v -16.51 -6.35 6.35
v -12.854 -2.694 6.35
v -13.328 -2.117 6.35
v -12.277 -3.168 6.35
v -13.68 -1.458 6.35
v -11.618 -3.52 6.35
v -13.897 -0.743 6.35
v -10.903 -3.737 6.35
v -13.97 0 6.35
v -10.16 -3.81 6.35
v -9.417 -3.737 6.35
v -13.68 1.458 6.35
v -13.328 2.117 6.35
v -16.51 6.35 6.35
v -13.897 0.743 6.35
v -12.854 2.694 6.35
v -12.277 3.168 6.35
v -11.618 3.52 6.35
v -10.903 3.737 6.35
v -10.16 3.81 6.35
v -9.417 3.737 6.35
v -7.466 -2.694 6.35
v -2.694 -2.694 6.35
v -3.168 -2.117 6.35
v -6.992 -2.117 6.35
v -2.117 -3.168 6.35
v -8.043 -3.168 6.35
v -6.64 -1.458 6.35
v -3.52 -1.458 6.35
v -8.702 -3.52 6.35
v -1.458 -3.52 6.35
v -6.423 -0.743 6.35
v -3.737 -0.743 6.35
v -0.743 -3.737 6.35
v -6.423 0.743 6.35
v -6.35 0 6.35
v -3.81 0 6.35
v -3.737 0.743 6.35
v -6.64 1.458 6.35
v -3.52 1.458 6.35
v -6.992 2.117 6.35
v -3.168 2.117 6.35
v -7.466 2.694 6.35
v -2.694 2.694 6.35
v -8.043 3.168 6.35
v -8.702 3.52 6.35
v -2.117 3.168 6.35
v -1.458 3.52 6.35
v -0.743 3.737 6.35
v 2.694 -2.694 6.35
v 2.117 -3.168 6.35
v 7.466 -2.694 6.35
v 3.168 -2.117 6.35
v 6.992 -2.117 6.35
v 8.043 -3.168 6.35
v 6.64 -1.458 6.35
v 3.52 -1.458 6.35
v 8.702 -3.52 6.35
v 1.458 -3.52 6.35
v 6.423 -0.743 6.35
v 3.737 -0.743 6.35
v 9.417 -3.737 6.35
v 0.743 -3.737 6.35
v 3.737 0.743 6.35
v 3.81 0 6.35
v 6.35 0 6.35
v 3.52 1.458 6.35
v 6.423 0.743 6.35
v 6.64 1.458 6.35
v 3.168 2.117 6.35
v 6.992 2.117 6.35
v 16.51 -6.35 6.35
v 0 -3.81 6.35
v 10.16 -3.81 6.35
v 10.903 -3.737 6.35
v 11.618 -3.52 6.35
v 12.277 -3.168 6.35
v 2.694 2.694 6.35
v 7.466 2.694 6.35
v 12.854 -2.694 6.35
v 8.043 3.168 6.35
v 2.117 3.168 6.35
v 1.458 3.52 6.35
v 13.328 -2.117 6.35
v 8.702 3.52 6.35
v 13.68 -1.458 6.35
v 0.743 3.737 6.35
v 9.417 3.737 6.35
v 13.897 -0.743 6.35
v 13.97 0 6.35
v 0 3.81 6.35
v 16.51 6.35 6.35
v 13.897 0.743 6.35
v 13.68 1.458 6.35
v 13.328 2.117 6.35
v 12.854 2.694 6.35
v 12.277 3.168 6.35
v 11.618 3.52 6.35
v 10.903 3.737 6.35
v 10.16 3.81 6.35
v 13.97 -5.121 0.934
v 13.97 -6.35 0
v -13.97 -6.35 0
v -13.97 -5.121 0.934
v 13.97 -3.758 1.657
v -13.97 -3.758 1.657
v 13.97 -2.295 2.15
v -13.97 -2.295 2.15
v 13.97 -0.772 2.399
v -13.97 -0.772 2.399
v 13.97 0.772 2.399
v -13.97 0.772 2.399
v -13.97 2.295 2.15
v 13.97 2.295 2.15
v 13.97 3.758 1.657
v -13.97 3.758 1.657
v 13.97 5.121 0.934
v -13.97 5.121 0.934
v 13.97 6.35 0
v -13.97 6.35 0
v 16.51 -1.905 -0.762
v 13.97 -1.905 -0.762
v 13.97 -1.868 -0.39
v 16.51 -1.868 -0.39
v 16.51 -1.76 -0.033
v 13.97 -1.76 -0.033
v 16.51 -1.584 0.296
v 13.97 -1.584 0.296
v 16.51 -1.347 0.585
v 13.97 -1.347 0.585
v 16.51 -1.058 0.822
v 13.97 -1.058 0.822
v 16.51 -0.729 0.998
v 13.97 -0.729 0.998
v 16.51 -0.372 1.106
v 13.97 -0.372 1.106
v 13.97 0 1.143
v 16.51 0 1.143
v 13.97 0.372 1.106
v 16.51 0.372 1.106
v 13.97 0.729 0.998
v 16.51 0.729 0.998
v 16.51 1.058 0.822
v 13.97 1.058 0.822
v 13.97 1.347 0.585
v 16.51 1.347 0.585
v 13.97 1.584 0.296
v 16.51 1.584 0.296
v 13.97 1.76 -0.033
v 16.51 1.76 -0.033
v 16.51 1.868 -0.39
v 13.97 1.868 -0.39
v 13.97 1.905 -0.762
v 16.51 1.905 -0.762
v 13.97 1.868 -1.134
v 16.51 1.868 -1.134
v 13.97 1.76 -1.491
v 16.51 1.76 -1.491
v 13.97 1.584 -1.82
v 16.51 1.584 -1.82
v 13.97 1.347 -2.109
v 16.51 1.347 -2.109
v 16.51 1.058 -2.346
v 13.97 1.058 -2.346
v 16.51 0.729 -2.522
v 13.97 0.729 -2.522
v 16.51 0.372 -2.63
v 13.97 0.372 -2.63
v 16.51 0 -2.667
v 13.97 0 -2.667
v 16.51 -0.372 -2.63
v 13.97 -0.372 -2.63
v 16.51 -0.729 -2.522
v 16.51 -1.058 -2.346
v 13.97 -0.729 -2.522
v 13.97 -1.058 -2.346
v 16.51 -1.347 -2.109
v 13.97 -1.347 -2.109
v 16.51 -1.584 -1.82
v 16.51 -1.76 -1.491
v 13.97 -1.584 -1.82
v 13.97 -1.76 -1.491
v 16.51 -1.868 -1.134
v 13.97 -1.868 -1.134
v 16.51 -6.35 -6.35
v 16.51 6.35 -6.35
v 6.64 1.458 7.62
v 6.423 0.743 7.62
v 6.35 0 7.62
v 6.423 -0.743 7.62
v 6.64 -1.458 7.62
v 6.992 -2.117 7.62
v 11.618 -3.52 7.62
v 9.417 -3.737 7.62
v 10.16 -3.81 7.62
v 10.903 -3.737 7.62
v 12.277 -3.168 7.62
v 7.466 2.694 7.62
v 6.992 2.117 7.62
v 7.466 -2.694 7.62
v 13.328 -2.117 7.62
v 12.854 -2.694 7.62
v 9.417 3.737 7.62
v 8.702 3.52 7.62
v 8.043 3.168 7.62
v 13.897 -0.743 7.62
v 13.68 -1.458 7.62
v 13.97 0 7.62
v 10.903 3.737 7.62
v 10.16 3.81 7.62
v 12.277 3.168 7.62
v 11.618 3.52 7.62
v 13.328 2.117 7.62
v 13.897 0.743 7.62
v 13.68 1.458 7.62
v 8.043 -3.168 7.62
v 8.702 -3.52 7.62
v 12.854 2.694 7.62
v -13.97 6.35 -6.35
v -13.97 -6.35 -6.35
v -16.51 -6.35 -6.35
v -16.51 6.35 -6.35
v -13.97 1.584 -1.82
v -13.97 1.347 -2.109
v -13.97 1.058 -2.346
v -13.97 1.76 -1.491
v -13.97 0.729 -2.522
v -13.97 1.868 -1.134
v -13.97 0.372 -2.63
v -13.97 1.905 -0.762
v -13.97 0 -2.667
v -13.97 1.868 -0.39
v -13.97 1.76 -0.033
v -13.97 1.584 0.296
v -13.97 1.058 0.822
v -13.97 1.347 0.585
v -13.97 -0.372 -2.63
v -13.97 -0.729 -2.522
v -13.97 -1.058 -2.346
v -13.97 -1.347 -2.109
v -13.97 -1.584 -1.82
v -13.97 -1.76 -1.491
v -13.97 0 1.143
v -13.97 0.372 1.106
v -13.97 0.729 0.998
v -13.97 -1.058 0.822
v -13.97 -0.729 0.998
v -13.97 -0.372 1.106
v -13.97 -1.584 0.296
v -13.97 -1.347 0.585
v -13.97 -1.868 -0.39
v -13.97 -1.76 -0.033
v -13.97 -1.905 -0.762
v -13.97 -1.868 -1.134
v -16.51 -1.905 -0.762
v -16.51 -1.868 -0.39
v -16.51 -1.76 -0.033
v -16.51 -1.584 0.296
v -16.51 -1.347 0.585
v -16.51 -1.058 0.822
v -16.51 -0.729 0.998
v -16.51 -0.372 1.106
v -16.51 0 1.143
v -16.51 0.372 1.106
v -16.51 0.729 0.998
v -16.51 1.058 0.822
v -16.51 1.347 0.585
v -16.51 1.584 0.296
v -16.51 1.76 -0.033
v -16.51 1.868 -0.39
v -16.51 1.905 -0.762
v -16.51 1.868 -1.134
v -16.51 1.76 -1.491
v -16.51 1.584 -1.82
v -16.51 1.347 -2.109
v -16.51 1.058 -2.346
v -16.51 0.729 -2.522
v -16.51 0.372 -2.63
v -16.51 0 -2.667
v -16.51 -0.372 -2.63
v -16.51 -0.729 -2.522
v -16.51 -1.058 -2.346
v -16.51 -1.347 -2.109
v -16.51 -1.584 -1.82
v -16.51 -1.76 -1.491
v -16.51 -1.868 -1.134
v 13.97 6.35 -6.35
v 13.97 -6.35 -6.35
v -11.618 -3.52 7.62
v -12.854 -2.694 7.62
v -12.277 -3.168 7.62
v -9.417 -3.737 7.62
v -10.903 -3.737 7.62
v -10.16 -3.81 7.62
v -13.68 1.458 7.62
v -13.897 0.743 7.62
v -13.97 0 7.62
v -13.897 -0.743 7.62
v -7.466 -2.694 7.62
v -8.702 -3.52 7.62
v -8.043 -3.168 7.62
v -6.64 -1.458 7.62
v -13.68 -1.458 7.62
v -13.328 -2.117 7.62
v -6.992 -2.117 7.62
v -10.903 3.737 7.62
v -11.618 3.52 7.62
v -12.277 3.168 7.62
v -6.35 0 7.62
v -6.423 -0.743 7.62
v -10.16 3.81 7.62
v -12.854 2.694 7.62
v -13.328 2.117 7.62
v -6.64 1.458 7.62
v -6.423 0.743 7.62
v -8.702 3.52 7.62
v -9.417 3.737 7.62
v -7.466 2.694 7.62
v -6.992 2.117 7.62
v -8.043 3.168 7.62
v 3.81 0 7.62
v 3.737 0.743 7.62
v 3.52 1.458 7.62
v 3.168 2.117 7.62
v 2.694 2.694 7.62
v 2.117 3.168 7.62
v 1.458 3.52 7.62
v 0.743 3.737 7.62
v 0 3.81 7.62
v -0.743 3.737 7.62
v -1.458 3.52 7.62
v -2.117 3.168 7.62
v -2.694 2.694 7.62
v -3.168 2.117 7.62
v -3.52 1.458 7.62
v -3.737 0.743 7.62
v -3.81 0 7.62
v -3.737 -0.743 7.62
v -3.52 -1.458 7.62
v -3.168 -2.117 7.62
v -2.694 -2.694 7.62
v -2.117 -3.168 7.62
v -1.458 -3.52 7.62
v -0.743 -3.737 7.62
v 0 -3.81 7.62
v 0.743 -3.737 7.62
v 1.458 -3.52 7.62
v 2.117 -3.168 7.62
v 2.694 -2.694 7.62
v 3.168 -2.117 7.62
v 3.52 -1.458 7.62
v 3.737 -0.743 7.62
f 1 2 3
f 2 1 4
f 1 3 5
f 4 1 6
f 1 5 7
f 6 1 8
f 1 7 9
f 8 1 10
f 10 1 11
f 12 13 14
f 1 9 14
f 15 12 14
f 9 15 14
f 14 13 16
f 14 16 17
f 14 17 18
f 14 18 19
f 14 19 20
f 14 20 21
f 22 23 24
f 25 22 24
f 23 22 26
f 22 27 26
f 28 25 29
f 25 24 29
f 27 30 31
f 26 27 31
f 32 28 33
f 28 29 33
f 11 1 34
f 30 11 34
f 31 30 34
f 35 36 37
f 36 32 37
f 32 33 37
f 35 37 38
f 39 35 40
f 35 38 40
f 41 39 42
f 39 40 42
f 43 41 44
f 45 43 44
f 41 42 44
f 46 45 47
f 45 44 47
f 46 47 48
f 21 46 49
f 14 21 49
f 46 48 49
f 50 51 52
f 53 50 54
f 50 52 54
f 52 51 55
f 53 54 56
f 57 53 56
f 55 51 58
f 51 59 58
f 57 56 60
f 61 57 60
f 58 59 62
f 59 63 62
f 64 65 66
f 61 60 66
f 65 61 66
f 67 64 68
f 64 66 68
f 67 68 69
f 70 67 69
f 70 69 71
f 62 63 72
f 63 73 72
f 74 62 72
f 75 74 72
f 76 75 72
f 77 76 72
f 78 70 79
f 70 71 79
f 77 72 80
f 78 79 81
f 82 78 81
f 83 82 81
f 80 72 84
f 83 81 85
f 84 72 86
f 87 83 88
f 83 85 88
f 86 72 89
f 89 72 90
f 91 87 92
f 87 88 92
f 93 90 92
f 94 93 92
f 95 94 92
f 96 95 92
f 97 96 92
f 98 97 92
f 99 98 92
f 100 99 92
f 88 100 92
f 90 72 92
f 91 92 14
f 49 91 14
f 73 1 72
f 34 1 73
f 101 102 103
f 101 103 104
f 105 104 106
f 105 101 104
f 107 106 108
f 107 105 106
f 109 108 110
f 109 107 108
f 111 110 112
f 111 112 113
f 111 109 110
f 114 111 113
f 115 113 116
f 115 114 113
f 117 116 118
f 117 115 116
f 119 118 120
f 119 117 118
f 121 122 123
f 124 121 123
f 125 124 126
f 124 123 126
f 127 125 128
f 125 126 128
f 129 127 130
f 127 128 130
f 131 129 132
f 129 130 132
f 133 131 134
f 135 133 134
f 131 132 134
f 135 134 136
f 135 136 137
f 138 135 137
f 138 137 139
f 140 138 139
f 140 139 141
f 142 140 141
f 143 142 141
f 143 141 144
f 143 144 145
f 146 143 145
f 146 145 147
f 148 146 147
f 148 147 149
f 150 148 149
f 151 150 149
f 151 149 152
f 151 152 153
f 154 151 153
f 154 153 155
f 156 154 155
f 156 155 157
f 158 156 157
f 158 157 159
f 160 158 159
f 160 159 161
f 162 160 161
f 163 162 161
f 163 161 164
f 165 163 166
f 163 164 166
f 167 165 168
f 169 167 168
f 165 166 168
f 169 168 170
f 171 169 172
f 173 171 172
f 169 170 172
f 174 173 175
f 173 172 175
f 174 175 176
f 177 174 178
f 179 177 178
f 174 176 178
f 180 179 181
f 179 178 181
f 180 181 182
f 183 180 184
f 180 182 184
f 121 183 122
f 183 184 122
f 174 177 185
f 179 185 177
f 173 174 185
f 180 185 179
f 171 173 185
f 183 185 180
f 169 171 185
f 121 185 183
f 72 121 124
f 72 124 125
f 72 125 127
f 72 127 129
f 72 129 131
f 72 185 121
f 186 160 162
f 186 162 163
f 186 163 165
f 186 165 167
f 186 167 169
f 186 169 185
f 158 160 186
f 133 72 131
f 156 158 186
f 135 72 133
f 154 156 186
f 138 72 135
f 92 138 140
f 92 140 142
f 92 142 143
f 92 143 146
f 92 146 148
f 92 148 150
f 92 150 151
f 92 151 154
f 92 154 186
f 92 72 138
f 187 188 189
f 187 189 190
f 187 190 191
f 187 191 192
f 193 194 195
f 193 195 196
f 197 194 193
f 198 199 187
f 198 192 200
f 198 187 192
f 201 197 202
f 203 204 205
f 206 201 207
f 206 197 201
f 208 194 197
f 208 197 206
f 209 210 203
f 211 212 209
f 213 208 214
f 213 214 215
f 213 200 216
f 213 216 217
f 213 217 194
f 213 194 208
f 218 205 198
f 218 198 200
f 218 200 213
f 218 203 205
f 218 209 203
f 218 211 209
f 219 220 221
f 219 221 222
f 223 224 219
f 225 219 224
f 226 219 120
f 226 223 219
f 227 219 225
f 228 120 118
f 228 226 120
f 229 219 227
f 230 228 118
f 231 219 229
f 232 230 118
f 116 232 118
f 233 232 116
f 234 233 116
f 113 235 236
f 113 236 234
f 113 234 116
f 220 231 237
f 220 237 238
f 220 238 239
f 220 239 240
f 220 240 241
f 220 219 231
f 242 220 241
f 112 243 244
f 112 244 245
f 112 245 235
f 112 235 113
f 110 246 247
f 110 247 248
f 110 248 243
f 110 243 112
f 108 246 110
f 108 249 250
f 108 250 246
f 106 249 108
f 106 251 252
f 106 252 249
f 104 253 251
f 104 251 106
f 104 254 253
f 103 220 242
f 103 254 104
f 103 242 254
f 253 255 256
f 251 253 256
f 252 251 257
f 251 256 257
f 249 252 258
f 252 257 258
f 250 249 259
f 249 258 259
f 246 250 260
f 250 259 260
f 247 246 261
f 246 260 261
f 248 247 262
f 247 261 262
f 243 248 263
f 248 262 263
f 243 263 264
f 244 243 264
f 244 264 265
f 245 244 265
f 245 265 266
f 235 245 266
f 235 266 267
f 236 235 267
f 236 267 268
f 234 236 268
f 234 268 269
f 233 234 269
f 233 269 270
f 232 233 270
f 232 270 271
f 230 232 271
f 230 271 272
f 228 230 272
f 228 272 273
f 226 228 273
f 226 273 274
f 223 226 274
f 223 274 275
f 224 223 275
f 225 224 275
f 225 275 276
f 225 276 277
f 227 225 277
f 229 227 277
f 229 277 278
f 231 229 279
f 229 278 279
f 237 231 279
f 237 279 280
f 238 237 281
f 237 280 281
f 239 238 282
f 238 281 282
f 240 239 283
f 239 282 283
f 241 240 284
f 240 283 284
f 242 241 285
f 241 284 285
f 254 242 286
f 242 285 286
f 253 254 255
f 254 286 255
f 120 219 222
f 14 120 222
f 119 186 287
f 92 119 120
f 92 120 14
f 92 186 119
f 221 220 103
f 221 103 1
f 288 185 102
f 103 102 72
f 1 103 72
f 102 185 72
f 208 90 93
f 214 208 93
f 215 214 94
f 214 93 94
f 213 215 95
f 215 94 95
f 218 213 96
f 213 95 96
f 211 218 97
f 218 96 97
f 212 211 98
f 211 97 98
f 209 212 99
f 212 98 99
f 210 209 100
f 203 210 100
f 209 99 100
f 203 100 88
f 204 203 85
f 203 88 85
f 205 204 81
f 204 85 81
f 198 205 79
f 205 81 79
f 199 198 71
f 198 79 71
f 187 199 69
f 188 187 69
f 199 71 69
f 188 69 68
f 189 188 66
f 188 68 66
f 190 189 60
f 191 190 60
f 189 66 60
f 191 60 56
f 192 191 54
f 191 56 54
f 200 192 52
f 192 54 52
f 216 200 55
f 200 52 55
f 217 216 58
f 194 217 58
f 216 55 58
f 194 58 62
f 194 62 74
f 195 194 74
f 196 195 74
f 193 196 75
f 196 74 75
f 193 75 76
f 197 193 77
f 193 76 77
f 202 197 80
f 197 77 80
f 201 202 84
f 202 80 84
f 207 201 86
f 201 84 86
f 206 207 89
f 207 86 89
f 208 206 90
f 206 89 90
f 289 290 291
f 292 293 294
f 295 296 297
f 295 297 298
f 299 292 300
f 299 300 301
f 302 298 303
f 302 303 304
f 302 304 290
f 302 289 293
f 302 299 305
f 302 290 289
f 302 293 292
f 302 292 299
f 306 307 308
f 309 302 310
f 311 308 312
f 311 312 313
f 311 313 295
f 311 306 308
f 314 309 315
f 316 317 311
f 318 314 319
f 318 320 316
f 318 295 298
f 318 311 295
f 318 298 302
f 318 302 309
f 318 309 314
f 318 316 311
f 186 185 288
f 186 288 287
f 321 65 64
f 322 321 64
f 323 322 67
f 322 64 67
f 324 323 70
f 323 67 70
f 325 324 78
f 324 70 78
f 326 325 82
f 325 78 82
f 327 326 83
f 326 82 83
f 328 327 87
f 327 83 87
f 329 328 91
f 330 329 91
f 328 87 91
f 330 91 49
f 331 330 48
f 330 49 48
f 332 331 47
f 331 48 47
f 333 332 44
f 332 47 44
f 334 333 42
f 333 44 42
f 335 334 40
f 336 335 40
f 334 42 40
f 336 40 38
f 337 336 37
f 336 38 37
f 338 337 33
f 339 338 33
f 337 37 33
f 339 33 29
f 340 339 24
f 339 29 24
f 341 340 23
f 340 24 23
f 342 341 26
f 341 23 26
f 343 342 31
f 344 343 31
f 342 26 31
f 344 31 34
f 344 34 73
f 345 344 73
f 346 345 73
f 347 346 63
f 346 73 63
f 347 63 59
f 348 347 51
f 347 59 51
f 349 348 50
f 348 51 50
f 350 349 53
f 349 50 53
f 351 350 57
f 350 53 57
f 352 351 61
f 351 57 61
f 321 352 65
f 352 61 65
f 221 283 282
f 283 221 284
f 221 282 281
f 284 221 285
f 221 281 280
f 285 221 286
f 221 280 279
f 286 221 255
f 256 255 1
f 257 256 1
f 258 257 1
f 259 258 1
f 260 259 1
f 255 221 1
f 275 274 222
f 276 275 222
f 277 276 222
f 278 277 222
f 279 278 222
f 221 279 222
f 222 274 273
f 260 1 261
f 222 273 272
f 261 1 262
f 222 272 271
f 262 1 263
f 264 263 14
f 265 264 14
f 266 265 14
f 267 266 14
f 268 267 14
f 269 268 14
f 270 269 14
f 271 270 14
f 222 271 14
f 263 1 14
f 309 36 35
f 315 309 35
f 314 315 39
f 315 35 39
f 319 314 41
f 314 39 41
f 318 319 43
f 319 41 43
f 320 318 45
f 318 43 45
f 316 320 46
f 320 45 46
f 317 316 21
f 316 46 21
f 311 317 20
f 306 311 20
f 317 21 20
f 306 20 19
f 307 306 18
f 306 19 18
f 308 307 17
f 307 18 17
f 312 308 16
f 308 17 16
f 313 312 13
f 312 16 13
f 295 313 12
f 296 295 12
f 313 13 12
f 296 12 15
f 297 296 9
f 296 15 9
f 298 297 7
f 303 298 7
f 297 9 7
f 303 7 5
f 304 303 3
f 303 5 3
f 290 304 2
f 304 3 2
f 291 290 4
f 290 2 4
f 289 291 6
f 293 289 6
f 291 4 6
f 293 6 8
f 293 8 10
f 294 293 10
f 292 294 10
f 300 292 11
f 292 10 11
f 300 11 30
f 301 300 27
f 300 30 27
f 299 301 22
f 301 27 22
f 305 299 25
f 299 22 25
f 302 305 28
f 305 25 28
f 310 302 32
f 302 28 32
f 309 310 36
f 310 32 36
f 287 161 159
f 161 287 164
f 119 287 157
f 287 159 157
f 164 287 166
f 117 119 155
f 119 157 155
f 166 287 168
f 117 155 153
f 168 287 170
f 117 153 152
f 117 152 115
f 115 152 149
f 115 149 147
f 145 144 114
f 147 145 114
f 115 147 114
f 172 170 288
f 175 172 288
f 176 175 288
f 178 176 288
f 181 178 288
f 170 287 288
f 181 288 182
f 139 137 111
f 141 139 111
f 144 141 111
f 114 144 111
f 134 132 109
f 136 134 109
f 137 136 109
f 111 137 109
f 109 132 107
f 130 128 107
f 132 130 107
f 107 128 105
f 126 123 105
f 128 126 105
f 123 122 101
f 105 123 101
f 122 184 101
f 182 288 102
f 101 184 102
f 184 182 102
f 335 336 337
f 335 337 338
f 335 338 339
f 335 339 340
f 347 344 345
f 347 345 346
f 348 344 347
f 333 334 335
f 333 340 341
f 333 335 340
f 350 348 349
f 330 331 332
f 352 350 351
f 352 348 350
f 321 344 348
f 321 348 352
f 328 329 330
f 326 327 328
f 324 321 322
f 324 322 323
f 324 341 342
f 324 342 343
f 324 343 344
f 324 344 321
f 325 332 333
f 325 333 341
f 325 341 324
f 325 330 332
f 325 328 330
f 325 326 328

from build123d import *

# Parameters (mm, degrees)
F0_W          = 12.7
F0_H          = 12.7
F1_DEPTH      = 16.51
F1_DEPTH_BACK = 16.51
F2_W          = 27.94
F2_H          = 6.35
F3_DEPTH      = 25.4
F5_DEPTH      = 27.94
F7_D          = 3.81
F8_R          = 3.81
F9_DEPTH      = 1.27


with BuildPart() as f1:
    # F0 (on Right) → F1 (new body, two sides)
    with BuildSketch(Plane.YZ) as f1_sk:
        Rectangle(F0_W, F0_H)
    extrude(amount=F1_DEPTH)
    extrude(f1_sk.sketch, amount=-F1_DEPTH_BACK)

    # F2 (on face) → F3 (cut)
    with BuildSketch(Plane.XZ.offset(6.35)):
        with Locations((0, -3.175)):
            Rectangle(F2_W, F2_H)
    extrude(amount=-F3_DEPTH, mode=Mode.SUBTRACT)

    # F4 (on face) → F5 (cut)
    with BuildSketch(Plane(origin=(13.97, 0, 0), x_dir=(0, -1, 0), z_dir=(-1, 0, 0))):
        with BuildLine():
            Line((-6.35, 0), (6.35, 0))
            ThreePointArc((6.35, 0), (0, 2.430635), (-6.35, 0))
        make_face()
    extrude(amount=F5_DEPTH, mode=Mode.SUBTRACT)

    # F7 (through all)
    with Locations(Plane.YZ.offset(16.51)):
        with Locations((0, -0.762)):
            Hole(F7_D / 2)

    # F8 (on face) → F9 (join)
    with BuildSketch(Plane.XY.offset(6.35)):
        with Locations((-10.16, 0)):
            Circle(F8_R)
        Circle(F8_R)
        with Locations((10.16, 0)):
            Circle(F8_R)
    extrude(amount=F9_DEPTH)


solid = f1.part
